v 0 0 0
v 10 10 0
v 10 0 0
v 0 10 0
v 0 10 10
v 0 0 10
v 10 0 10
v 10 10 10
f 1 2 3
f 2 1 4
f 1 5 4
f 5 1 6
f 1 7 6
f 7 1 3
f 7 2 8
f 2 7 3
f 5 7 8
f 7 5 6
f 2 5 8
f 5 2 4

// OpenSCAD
//Author: Chris Correll
//Date: 8/18/22
//Description: Lesson 1.0 Introduction to OpenSCAD

/*
Explain what openSCAD is, have student read the terminology text file
*/

/*
Explain what a comment is: computer ignores code that follows on the same line as a single line comment or is in a comment block
//single line comment
/* 
Multi-line
comment block
*/

/* 
Explore the program. Explain the different windows and what they do: editor window-where to write code, preview window-where to see code, tab bar ( can open ,multiple code documents and tab and use tab navigation commands ctrl +tab to switch bewteen them), console- where text output about your code shows upwhen you preview or render it, error-log- a table that describes what and where errors are that show in your code
*/

/* 
Helpful JAWS and Windows commands for text editing:
If JAWS stops reading try focusing the menu bar and then pressing escape or focusing the editor window
Move cursor by word: CTRL + LEFT/RIGHT ARROW key
Move cursor to start of line: HOME (FN + LEFT ARROW KEY on most laptops)
Move cursor to end of line: END (FN + RIGHT ARROW KEY on most laptops)
Move cursor to beginning of file: CTRL + END
Move cursor to end of file: CTRL + HOME
Select: HOLD SHIFT AND MOVE CURSOR
Change punctuation level: JAWS KEY + SHIFT + 2
Read all from cursor: JAWS KEY + A
Read Current line: JAWS KEY + UP ARROW
Temporarily increase/decrease voice rate: ALT + CTRL + PAGE UP/PAGE DOWN (fn key and up/ down arrow on most laptops)
Spell curent line: JAWS KEY + UP ARROW twice quickly

*/

/*
NOTE:
We will be exploring VS code later in the semester as an alternative to working in the OpenSCAD editor as it is sometimes buggy with JAWS. Remmember to change focus to the menu bar and press esc if JAWS stops reading the openSCAD editor
*/

/* 
Exploring the Menus
ALT will focus the menu bar
You can use first letter navigation to get to things quickly i.e. the layered key stroke ALT > w > e will bring you to the 
Have students Focus the different windows (console, editor, error log)
*/
 
/*
Optional Customization (perhaps not accessible?)
Edit > Preferences > Editor > Auto indent off
Edit > Preferences > Editor > Number Scroll Via Mouse Wheel off 
Edit > Preferences > Editor > Autocomplete off
Edit > Preferences > Advanced > Show Welcome Screen off
Design > Turn off automatic reload and preview
View > Hide 3D view and Editor tool bars
Window > Hide console
*/

/*
First shape cube
Talk about parameters
Rendering 
Exporting to stl etc.
*/

//Your first shape preview it and then try the below preview keyboard commands
cube([1,1,1]);

//You can fit the shape to the whole preview window with the command control + shift + v (alt > v > view all)
//You can change the view projection using ctrl + 4 through 9
//Once completed comment out the code with a single line comment
//Make a larger cube render it, export it as an stl email it to me

//Talk about scaling have braille rulers show students 
// openSCAD is unitless but we can assume that we will be working with one unit= 1mm
cube([10,10,10]);    
